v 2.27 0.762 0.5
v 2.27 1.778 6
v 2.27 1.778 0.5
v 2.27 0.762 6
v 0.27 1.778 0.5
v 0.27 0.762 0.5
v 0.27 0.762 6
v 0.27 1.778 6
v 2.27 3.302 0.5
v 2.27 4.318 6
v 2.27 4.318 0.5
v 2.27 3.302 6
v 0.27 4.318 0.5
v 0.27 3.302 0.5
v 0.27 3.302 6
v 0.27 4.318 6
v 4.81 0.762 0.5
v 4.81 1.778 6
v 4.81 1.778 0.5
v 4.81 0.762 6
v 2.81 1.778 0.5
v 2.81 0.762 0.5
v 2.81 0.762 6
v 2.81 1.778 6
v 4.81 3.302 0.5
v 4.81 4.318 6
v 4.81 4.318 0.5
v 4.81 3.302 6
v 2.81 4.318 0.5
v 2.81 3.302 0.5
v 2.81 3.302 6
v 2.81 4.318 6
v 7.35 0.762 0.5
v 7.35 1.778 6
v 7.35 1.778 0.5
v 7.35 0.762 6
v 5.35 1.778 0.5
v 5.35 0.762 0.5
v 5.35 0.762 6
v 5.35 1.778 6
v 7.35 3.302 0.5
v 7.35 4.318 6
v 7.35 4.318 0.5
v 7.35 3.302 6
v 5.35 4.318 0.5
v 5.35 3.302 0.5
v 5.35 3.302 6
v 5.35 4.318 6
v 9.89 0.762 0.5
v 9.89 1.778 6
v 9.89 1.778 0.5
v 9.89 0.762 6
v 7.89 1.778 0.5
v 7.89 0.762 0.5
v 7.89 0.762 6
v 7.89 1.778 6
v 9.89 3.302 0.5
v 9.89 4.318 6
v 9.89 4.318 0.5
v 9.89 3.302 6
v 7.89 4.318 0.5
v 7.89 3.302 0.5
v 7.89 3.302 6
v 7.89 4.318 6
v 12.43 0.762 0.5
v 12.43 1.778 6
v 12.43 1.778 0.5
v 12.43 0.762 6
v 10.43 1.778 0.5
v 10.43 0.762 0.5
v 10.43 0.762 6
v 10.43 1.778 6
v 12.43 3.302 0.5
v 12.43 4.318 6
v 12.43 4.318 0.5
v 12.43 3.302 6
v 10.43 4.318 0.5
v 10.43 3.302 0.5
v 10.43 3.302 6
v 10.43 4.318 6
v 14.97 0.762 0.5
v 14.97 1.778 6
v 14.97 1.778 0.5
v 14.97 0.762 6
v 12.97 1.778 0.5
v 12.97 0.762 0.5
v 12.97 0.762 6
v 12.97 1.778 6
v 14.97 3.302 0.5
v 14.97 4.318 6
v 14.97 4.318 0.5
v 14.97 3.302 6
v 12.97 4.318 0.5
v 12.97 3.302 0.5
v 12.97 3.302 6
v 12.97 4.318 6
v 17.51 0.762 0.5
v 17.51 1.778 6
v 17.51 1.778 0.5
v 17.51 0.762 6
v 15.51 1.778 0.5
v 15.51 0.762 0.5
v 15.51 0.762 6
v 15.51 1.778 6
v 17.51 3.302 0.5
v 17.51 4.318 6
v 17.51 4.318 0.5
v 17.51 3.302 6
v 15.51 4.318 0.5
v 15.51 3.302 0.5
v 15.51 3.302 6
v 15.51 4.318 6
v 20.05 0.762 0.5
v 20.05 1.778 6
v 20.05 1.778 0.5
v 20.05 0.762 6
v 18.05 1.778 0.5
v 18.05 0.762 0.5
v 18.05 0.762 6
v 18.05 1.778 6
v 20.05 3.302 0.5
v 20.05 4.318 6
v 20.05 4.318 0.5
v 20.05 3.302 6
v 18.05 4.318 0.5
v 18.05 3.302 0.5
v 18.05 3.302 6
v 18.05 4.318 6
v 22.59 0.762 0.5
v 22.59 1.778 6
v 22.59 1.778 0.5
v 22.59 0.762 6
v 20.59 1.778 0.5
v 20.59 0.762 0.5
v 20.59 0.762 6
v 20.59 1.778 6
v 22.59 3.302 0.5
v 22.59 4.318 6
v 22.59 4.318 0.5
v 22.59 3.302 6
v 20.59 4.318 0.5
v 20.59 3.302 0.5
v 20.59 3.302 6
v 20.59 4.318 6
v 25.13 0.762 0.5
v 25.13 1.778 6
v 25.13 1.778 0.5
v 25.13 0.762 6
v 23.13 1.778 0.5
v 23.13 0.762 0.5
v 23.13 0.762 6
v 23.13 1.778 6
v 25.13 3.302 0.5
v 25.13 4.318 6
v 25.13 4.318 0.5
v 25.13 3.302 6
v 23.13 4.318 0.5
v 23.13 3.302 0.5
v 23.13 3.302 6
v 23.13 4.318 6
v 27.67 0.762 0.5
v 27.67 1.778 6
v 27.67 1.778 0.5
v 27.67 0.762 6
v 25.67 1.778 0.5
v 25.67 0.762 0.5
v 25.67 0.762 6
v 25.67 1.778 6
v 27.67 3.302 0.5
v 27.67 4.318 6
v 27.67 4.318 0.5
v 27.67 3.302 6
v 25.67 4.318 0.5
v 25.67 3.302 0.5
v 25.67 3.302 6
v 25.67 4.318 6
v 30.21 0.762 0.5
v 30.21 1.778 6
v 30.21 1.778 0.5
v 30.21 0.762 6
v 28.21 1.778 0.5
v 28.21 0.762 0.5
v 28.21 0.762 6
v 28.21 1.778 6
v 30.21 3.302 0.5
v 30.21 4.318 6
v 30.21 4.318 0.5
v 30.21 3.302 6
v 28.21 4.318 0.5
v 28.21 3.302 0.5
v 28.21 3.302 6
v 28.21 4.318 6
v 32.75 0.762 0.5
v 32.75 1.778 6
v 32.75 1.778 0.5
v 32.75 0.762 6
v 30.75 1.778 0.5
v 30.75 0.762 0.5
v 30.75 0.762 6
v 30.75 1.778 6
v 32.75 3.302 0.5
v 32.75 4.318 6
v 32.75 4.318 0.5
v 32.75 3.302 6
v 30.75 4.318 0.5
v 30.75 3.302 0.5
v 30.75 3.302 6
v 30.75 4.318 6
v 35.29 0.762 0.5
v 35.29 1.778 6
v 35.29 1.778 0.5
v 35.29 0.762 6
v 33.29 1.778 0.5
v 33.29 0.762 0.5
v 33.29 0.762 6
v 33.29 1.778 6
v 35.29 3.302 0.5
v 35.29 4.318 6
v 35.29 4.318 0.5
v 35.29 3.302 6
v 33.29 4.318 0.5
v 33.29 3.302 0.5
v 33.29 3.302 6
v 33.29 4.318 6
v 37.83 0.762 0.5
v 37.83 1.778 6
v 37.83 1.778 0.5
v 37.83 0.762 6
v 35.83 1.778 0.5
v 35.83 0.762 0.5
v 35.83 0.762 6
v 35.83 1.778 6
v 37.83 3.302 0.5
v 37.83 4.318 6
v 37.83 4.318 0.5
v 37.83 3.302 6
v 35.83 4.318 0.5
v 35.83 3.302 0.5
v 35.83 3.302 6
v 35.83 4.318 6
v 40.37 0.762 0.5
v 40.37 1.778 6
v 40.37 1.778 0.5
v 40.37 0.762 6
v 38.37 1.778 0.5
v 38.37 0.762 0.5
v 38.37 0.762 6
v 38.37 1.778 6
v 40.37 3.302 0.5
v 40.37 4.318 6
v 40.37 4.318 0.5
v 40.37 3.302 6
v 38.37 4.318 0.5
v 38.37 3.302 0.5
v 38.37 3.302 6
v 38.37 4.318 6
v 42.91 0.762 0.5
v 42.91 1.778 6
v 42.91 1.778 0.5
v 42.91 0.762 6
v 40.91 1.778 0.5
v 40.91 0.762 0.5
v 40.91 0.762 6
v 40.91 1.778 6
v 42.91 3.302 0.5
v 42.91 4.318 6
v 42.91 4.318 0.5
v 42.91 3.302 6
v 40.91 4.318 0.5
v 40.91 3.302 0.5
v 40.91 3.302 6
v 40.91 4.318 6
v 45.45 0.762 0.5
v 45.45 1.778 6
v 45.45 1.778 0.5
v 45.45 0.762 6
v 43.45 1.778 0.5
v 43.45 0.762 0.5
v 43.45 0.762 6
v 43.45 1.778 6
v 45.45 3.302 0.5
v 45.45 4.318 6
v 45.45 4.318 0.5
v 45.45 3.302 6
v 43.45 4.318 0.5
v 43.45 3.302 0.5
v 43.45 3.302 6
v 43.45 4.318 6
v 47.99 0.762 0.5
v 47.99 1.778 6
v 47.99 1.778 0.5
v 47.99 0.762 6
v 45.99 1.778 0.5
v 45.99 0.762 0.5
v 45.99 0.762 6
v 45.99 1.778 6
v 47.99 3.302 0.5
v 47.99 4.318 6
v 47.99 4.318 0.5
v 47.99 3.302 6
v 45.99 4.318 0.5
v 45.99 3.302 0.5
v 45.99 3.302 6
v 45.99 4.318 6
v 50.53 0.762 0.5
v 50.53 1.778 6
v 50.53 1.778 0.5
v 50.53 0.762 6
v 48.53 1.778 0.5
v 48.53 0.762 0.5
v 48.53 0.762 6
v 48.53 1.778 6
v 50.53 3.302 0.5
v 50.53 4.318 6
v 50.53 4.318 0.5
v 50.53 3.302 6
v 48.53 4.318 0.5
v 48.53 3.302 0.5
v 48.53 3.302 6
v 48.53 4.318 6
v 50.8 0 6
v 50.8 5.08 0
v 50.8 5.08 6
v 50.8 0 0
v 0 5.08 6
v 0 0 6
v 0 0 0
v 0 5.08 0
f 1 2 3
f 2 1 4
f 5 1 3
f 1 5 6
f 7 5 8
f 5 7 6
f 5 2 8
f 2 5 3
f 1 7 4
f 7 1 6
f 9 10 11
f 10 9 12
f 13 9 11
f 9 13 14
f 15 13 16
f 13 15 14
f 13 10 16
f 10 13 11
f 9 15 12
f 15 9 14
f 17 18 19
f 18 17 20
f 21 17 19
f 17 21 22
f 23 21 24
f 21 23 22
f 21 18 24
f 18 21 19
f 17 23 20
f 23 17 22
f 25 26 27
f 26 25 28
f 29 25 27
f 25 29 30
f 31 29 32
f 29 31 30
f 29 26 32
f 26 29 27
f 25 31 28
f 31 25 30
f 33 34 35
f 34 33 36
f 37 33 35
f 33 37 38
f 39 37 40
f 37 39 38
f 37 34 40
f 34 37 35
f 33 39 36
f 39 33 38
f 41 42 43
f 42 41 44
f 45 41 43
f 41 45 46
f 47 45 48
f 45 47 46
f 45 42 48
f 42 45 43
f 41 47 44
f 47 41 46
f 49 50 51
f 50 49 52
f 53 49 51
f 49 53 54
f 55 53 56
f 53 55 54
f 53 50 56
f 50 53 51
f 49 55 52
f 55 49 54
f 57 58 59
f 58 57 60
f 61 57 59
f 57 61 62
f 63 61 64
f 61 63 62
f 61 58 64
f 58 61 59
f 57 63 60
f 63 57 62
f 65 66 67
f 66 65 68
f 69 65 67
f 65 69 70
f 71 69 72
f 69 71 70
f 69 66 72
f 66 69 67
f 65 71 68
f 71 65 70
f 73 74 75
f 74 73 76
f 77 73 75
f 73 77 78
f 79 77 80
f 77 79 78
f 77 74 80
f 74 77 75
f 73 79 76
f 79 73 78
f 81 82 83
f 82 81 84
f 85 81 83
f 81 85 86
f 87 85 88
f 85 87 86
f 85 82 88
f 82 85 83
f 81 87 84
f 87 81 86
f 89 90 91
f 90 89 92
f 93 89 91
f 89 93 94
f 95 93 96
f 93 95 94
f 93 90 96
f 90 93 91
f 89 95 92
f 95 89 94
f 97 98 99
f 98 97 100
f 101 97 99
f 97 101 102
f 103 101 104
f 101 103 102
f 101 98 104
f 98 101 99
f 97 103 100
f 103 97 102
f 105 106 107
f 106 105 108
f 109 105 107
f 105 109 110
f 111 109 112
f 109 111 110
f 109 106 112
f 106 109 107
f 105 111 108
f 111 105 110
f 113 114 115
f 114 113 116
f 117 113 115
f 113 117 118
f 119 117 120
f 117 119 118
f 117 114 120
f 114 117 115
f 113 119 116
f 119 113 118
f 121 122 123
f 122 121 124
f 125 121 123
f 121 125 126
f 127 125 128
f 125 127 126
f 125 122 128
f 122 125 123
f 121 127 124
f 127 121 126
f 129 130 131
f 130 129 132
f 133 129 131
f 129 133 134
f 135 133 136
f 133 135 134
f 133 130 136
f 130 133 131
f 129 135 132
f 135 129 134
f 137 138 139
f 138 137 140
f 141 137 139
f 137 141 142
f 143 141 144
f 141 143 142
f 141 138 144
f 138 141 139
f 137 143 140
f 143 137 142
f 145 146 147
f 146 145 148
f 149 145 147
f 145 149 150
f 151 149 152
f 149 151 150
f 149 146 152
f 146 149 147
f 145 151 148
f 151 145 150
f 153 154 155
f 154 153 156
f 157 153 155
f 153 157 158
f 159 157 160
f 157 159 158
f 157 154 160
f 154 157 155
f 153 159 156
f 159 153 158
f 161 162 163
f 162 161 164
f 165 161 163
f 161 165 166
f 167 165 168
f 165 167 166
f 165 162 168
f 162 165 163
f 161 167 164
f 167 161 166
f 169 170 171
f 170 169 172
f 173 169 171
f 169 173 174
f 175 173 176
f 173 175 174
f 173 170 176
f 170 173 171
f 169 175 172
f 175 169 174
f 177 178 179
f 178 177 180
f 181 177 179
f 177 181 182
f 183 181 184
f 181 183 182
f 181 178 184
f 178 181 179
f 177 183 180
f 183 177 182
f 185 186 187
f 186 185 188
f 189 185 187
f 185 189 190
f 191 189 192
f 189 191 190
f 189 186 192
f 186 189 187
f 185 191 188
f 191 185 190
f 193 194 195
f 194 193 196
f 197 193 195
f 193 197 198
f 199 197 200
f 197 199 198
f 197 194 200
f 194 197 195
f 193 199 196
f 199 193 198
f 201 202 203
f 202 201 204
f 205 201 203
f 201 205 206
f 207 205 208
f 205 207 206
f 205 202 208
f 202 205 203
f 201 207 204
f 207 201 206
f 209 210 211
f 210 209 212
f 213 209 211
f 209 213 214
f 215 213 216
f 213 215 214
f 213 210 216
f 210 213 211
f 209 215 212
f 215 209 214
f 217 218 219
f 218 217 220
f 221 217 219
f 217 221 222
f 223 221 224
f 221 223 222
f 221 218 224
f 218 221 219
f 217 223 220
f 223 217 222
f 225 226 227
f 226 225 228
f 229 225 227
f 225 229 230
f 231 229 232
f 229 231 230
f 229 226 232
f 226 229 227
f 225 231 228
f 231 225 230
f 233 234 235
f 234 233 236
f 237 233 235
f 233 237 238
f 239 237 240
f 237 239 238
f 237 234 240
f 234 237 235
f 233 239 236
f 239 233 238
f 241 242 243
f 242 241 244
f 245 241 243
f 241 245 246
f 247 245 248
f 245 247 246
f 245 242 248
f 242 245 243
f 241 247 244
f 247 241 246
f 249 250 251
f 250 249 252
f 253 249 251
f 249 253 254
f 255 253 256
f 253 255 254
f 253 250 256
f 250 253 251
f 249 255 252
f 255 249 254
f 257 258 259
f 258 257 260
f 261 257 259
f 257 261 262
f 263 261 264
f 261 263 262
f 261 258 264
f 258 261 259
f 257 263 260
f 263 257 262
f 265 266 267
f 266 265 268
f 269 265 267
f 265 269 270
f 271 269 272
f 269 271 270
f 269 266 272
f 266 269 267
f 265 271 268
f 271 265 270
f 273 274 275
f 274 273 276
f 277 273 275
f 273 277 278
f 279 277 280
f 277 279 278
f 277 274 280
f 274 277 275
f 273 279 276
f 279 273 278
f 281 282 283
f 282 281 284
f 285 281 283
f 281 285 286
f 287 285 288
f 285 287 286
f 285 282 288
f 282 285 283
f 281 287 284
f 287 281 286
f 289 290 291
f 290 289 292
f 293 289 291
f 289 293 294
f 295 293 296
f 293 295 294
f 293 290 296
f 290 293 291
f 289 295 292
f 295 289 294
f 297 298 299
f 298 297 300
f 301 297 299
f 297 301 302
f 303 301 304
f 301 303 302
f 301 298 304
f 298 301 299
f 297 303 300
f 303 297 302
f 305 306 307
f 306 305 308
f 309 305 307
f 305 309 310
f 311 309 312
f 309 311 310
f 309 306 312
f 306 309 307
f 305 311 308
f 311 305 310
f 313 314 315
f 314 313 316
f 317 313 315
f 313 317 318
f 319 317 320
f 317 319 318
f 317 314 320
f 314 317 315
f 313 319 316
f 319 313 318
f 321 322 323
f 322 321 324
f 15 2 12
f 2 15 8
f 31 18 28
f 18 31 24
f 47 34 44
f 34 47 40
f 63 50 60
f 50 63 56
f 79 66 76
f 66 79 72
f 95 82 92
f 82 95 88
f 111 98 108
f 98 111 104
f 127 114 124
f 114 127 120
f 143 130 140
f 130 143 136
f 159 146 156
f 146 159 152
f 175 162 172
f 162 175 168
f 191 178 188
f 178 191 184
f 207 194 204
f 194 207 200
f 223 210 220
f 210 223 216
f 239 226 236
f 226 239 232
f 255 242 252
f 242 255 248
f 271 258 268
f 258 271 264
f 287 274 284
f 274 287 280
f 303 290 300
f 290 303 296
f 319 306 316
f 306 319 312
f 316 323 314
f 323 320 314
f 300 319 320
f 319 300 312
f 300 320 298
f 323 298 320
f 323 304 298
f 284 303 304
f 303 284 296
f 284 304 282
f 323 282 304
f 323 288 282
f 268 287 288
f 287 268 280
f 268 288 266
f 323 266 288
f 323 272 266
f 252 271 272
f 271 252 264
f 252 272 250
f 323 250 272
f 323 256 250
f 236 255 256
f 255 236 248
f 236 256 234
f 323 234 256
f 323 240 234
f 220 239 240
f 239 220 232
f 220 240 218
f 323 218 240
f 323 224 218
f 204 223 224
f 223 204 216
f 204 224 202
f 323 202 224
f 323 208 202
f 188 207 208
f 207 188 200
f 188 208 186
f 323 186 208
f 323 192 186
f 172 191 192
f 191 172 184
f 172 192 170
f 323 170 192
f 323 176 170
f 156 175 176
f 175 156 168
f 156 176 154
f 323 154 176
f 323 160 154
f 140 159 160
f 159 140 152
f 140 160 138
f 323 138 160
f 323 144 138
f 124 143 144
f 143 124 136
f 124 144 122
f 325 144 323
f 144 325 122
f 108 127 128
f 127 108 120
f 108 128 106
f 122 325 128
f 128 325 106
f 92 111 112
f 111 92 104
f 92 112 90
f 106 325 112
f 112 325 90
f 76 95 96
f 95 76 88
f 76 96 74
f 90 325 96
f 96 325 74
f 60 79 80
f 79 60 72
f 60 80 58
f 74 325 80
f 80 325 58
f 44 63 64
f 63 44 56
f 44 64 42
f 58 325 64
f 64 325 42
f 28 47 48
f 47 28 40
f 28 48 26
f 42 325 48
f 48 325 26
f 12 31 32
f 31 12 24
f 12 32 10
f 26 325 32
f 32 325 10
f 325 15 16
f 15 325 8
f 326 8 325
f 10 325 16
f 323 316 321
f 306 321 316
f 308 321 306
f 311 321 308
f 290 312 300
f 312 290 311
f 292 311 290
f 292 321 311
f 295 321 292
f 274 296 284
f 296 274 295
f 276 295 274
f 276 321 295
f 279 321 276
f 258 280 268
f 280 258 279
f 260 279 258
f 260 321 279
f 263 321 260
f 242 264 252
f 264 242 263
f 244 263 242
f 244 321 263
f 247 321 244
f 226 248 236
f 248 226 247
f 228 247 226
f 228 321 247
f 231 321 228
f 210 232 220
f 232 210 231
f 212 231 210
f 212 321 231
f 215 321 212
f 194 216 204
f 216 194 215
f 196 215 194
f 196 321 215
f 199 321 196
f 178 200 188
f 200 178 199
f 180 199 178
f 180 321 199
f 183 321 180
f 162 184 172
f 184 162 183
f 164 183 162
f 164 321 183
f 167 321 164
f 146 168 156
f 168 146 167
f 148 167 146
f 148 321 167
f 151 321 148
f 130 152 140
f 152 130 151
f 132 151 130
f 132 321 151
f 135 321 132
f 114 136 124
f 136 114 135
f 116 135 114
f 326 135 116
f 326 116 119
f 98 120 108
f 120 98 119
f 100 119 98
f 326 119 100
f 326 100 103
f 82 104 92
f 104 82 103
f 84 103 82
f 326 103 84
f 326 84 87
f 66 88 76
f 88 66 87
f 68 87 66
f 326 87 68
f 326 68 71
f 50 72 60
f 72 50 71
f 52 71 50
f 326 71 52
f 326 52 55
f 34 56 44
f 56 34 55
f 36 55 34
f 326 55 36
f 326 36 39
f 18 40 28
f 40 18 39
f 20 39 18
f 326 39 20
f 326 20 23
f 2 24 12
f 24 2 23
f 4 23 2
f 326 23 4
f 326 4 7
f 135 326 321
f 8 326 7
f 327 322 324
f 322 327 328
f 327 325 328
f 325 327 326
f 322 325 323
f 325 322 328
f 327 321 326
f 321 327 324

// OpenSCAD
// PinHeaderCover.scad

numPinRows = 2;
numPinsInRow = 20;

blockHeight = 6;

// Pins have .1 inch centers and are .025 inch square
// but we're working in millimeters
pinLength = 0.635;
pinWidth = 0.635;
pinHoleLength = pinLength * 3.15; // ends up with decent measures for 0.4mm nozzle
//pinHoleWidth = pinWidth * 1.89; // a bit looser
pinHoleWidth = pinWidth * 1.6; // for tighter holes
//pinHoleWidth = pinWidth * 1.26; // originally
pinStepX = 2.54;
pinStepY = 2.54;
pinOffsetX = pinStepX/2;
pinOffsetY = pinStepY/2;
pinOffsetZ = 0.5+blockHeight/2;

blockLength = numPinsInRow * pinStepX;
blockWidth = numPinRows * pinStepY;

difference() {
    cube([blockLength, blockWidth, blockHeight], center=false);
    for (x=[0:numPinsInRow-1], y=[0:numPinRows-1]) {
        translate([x*pinStepX+pinOffsetX, y*pinStepY+pinOffsetY, pinOffsetZ]) {
            cube([pinHoleLength, pinHoleWidth, blockHeight], center=true);
        }
    }
}

echo(version=version());
